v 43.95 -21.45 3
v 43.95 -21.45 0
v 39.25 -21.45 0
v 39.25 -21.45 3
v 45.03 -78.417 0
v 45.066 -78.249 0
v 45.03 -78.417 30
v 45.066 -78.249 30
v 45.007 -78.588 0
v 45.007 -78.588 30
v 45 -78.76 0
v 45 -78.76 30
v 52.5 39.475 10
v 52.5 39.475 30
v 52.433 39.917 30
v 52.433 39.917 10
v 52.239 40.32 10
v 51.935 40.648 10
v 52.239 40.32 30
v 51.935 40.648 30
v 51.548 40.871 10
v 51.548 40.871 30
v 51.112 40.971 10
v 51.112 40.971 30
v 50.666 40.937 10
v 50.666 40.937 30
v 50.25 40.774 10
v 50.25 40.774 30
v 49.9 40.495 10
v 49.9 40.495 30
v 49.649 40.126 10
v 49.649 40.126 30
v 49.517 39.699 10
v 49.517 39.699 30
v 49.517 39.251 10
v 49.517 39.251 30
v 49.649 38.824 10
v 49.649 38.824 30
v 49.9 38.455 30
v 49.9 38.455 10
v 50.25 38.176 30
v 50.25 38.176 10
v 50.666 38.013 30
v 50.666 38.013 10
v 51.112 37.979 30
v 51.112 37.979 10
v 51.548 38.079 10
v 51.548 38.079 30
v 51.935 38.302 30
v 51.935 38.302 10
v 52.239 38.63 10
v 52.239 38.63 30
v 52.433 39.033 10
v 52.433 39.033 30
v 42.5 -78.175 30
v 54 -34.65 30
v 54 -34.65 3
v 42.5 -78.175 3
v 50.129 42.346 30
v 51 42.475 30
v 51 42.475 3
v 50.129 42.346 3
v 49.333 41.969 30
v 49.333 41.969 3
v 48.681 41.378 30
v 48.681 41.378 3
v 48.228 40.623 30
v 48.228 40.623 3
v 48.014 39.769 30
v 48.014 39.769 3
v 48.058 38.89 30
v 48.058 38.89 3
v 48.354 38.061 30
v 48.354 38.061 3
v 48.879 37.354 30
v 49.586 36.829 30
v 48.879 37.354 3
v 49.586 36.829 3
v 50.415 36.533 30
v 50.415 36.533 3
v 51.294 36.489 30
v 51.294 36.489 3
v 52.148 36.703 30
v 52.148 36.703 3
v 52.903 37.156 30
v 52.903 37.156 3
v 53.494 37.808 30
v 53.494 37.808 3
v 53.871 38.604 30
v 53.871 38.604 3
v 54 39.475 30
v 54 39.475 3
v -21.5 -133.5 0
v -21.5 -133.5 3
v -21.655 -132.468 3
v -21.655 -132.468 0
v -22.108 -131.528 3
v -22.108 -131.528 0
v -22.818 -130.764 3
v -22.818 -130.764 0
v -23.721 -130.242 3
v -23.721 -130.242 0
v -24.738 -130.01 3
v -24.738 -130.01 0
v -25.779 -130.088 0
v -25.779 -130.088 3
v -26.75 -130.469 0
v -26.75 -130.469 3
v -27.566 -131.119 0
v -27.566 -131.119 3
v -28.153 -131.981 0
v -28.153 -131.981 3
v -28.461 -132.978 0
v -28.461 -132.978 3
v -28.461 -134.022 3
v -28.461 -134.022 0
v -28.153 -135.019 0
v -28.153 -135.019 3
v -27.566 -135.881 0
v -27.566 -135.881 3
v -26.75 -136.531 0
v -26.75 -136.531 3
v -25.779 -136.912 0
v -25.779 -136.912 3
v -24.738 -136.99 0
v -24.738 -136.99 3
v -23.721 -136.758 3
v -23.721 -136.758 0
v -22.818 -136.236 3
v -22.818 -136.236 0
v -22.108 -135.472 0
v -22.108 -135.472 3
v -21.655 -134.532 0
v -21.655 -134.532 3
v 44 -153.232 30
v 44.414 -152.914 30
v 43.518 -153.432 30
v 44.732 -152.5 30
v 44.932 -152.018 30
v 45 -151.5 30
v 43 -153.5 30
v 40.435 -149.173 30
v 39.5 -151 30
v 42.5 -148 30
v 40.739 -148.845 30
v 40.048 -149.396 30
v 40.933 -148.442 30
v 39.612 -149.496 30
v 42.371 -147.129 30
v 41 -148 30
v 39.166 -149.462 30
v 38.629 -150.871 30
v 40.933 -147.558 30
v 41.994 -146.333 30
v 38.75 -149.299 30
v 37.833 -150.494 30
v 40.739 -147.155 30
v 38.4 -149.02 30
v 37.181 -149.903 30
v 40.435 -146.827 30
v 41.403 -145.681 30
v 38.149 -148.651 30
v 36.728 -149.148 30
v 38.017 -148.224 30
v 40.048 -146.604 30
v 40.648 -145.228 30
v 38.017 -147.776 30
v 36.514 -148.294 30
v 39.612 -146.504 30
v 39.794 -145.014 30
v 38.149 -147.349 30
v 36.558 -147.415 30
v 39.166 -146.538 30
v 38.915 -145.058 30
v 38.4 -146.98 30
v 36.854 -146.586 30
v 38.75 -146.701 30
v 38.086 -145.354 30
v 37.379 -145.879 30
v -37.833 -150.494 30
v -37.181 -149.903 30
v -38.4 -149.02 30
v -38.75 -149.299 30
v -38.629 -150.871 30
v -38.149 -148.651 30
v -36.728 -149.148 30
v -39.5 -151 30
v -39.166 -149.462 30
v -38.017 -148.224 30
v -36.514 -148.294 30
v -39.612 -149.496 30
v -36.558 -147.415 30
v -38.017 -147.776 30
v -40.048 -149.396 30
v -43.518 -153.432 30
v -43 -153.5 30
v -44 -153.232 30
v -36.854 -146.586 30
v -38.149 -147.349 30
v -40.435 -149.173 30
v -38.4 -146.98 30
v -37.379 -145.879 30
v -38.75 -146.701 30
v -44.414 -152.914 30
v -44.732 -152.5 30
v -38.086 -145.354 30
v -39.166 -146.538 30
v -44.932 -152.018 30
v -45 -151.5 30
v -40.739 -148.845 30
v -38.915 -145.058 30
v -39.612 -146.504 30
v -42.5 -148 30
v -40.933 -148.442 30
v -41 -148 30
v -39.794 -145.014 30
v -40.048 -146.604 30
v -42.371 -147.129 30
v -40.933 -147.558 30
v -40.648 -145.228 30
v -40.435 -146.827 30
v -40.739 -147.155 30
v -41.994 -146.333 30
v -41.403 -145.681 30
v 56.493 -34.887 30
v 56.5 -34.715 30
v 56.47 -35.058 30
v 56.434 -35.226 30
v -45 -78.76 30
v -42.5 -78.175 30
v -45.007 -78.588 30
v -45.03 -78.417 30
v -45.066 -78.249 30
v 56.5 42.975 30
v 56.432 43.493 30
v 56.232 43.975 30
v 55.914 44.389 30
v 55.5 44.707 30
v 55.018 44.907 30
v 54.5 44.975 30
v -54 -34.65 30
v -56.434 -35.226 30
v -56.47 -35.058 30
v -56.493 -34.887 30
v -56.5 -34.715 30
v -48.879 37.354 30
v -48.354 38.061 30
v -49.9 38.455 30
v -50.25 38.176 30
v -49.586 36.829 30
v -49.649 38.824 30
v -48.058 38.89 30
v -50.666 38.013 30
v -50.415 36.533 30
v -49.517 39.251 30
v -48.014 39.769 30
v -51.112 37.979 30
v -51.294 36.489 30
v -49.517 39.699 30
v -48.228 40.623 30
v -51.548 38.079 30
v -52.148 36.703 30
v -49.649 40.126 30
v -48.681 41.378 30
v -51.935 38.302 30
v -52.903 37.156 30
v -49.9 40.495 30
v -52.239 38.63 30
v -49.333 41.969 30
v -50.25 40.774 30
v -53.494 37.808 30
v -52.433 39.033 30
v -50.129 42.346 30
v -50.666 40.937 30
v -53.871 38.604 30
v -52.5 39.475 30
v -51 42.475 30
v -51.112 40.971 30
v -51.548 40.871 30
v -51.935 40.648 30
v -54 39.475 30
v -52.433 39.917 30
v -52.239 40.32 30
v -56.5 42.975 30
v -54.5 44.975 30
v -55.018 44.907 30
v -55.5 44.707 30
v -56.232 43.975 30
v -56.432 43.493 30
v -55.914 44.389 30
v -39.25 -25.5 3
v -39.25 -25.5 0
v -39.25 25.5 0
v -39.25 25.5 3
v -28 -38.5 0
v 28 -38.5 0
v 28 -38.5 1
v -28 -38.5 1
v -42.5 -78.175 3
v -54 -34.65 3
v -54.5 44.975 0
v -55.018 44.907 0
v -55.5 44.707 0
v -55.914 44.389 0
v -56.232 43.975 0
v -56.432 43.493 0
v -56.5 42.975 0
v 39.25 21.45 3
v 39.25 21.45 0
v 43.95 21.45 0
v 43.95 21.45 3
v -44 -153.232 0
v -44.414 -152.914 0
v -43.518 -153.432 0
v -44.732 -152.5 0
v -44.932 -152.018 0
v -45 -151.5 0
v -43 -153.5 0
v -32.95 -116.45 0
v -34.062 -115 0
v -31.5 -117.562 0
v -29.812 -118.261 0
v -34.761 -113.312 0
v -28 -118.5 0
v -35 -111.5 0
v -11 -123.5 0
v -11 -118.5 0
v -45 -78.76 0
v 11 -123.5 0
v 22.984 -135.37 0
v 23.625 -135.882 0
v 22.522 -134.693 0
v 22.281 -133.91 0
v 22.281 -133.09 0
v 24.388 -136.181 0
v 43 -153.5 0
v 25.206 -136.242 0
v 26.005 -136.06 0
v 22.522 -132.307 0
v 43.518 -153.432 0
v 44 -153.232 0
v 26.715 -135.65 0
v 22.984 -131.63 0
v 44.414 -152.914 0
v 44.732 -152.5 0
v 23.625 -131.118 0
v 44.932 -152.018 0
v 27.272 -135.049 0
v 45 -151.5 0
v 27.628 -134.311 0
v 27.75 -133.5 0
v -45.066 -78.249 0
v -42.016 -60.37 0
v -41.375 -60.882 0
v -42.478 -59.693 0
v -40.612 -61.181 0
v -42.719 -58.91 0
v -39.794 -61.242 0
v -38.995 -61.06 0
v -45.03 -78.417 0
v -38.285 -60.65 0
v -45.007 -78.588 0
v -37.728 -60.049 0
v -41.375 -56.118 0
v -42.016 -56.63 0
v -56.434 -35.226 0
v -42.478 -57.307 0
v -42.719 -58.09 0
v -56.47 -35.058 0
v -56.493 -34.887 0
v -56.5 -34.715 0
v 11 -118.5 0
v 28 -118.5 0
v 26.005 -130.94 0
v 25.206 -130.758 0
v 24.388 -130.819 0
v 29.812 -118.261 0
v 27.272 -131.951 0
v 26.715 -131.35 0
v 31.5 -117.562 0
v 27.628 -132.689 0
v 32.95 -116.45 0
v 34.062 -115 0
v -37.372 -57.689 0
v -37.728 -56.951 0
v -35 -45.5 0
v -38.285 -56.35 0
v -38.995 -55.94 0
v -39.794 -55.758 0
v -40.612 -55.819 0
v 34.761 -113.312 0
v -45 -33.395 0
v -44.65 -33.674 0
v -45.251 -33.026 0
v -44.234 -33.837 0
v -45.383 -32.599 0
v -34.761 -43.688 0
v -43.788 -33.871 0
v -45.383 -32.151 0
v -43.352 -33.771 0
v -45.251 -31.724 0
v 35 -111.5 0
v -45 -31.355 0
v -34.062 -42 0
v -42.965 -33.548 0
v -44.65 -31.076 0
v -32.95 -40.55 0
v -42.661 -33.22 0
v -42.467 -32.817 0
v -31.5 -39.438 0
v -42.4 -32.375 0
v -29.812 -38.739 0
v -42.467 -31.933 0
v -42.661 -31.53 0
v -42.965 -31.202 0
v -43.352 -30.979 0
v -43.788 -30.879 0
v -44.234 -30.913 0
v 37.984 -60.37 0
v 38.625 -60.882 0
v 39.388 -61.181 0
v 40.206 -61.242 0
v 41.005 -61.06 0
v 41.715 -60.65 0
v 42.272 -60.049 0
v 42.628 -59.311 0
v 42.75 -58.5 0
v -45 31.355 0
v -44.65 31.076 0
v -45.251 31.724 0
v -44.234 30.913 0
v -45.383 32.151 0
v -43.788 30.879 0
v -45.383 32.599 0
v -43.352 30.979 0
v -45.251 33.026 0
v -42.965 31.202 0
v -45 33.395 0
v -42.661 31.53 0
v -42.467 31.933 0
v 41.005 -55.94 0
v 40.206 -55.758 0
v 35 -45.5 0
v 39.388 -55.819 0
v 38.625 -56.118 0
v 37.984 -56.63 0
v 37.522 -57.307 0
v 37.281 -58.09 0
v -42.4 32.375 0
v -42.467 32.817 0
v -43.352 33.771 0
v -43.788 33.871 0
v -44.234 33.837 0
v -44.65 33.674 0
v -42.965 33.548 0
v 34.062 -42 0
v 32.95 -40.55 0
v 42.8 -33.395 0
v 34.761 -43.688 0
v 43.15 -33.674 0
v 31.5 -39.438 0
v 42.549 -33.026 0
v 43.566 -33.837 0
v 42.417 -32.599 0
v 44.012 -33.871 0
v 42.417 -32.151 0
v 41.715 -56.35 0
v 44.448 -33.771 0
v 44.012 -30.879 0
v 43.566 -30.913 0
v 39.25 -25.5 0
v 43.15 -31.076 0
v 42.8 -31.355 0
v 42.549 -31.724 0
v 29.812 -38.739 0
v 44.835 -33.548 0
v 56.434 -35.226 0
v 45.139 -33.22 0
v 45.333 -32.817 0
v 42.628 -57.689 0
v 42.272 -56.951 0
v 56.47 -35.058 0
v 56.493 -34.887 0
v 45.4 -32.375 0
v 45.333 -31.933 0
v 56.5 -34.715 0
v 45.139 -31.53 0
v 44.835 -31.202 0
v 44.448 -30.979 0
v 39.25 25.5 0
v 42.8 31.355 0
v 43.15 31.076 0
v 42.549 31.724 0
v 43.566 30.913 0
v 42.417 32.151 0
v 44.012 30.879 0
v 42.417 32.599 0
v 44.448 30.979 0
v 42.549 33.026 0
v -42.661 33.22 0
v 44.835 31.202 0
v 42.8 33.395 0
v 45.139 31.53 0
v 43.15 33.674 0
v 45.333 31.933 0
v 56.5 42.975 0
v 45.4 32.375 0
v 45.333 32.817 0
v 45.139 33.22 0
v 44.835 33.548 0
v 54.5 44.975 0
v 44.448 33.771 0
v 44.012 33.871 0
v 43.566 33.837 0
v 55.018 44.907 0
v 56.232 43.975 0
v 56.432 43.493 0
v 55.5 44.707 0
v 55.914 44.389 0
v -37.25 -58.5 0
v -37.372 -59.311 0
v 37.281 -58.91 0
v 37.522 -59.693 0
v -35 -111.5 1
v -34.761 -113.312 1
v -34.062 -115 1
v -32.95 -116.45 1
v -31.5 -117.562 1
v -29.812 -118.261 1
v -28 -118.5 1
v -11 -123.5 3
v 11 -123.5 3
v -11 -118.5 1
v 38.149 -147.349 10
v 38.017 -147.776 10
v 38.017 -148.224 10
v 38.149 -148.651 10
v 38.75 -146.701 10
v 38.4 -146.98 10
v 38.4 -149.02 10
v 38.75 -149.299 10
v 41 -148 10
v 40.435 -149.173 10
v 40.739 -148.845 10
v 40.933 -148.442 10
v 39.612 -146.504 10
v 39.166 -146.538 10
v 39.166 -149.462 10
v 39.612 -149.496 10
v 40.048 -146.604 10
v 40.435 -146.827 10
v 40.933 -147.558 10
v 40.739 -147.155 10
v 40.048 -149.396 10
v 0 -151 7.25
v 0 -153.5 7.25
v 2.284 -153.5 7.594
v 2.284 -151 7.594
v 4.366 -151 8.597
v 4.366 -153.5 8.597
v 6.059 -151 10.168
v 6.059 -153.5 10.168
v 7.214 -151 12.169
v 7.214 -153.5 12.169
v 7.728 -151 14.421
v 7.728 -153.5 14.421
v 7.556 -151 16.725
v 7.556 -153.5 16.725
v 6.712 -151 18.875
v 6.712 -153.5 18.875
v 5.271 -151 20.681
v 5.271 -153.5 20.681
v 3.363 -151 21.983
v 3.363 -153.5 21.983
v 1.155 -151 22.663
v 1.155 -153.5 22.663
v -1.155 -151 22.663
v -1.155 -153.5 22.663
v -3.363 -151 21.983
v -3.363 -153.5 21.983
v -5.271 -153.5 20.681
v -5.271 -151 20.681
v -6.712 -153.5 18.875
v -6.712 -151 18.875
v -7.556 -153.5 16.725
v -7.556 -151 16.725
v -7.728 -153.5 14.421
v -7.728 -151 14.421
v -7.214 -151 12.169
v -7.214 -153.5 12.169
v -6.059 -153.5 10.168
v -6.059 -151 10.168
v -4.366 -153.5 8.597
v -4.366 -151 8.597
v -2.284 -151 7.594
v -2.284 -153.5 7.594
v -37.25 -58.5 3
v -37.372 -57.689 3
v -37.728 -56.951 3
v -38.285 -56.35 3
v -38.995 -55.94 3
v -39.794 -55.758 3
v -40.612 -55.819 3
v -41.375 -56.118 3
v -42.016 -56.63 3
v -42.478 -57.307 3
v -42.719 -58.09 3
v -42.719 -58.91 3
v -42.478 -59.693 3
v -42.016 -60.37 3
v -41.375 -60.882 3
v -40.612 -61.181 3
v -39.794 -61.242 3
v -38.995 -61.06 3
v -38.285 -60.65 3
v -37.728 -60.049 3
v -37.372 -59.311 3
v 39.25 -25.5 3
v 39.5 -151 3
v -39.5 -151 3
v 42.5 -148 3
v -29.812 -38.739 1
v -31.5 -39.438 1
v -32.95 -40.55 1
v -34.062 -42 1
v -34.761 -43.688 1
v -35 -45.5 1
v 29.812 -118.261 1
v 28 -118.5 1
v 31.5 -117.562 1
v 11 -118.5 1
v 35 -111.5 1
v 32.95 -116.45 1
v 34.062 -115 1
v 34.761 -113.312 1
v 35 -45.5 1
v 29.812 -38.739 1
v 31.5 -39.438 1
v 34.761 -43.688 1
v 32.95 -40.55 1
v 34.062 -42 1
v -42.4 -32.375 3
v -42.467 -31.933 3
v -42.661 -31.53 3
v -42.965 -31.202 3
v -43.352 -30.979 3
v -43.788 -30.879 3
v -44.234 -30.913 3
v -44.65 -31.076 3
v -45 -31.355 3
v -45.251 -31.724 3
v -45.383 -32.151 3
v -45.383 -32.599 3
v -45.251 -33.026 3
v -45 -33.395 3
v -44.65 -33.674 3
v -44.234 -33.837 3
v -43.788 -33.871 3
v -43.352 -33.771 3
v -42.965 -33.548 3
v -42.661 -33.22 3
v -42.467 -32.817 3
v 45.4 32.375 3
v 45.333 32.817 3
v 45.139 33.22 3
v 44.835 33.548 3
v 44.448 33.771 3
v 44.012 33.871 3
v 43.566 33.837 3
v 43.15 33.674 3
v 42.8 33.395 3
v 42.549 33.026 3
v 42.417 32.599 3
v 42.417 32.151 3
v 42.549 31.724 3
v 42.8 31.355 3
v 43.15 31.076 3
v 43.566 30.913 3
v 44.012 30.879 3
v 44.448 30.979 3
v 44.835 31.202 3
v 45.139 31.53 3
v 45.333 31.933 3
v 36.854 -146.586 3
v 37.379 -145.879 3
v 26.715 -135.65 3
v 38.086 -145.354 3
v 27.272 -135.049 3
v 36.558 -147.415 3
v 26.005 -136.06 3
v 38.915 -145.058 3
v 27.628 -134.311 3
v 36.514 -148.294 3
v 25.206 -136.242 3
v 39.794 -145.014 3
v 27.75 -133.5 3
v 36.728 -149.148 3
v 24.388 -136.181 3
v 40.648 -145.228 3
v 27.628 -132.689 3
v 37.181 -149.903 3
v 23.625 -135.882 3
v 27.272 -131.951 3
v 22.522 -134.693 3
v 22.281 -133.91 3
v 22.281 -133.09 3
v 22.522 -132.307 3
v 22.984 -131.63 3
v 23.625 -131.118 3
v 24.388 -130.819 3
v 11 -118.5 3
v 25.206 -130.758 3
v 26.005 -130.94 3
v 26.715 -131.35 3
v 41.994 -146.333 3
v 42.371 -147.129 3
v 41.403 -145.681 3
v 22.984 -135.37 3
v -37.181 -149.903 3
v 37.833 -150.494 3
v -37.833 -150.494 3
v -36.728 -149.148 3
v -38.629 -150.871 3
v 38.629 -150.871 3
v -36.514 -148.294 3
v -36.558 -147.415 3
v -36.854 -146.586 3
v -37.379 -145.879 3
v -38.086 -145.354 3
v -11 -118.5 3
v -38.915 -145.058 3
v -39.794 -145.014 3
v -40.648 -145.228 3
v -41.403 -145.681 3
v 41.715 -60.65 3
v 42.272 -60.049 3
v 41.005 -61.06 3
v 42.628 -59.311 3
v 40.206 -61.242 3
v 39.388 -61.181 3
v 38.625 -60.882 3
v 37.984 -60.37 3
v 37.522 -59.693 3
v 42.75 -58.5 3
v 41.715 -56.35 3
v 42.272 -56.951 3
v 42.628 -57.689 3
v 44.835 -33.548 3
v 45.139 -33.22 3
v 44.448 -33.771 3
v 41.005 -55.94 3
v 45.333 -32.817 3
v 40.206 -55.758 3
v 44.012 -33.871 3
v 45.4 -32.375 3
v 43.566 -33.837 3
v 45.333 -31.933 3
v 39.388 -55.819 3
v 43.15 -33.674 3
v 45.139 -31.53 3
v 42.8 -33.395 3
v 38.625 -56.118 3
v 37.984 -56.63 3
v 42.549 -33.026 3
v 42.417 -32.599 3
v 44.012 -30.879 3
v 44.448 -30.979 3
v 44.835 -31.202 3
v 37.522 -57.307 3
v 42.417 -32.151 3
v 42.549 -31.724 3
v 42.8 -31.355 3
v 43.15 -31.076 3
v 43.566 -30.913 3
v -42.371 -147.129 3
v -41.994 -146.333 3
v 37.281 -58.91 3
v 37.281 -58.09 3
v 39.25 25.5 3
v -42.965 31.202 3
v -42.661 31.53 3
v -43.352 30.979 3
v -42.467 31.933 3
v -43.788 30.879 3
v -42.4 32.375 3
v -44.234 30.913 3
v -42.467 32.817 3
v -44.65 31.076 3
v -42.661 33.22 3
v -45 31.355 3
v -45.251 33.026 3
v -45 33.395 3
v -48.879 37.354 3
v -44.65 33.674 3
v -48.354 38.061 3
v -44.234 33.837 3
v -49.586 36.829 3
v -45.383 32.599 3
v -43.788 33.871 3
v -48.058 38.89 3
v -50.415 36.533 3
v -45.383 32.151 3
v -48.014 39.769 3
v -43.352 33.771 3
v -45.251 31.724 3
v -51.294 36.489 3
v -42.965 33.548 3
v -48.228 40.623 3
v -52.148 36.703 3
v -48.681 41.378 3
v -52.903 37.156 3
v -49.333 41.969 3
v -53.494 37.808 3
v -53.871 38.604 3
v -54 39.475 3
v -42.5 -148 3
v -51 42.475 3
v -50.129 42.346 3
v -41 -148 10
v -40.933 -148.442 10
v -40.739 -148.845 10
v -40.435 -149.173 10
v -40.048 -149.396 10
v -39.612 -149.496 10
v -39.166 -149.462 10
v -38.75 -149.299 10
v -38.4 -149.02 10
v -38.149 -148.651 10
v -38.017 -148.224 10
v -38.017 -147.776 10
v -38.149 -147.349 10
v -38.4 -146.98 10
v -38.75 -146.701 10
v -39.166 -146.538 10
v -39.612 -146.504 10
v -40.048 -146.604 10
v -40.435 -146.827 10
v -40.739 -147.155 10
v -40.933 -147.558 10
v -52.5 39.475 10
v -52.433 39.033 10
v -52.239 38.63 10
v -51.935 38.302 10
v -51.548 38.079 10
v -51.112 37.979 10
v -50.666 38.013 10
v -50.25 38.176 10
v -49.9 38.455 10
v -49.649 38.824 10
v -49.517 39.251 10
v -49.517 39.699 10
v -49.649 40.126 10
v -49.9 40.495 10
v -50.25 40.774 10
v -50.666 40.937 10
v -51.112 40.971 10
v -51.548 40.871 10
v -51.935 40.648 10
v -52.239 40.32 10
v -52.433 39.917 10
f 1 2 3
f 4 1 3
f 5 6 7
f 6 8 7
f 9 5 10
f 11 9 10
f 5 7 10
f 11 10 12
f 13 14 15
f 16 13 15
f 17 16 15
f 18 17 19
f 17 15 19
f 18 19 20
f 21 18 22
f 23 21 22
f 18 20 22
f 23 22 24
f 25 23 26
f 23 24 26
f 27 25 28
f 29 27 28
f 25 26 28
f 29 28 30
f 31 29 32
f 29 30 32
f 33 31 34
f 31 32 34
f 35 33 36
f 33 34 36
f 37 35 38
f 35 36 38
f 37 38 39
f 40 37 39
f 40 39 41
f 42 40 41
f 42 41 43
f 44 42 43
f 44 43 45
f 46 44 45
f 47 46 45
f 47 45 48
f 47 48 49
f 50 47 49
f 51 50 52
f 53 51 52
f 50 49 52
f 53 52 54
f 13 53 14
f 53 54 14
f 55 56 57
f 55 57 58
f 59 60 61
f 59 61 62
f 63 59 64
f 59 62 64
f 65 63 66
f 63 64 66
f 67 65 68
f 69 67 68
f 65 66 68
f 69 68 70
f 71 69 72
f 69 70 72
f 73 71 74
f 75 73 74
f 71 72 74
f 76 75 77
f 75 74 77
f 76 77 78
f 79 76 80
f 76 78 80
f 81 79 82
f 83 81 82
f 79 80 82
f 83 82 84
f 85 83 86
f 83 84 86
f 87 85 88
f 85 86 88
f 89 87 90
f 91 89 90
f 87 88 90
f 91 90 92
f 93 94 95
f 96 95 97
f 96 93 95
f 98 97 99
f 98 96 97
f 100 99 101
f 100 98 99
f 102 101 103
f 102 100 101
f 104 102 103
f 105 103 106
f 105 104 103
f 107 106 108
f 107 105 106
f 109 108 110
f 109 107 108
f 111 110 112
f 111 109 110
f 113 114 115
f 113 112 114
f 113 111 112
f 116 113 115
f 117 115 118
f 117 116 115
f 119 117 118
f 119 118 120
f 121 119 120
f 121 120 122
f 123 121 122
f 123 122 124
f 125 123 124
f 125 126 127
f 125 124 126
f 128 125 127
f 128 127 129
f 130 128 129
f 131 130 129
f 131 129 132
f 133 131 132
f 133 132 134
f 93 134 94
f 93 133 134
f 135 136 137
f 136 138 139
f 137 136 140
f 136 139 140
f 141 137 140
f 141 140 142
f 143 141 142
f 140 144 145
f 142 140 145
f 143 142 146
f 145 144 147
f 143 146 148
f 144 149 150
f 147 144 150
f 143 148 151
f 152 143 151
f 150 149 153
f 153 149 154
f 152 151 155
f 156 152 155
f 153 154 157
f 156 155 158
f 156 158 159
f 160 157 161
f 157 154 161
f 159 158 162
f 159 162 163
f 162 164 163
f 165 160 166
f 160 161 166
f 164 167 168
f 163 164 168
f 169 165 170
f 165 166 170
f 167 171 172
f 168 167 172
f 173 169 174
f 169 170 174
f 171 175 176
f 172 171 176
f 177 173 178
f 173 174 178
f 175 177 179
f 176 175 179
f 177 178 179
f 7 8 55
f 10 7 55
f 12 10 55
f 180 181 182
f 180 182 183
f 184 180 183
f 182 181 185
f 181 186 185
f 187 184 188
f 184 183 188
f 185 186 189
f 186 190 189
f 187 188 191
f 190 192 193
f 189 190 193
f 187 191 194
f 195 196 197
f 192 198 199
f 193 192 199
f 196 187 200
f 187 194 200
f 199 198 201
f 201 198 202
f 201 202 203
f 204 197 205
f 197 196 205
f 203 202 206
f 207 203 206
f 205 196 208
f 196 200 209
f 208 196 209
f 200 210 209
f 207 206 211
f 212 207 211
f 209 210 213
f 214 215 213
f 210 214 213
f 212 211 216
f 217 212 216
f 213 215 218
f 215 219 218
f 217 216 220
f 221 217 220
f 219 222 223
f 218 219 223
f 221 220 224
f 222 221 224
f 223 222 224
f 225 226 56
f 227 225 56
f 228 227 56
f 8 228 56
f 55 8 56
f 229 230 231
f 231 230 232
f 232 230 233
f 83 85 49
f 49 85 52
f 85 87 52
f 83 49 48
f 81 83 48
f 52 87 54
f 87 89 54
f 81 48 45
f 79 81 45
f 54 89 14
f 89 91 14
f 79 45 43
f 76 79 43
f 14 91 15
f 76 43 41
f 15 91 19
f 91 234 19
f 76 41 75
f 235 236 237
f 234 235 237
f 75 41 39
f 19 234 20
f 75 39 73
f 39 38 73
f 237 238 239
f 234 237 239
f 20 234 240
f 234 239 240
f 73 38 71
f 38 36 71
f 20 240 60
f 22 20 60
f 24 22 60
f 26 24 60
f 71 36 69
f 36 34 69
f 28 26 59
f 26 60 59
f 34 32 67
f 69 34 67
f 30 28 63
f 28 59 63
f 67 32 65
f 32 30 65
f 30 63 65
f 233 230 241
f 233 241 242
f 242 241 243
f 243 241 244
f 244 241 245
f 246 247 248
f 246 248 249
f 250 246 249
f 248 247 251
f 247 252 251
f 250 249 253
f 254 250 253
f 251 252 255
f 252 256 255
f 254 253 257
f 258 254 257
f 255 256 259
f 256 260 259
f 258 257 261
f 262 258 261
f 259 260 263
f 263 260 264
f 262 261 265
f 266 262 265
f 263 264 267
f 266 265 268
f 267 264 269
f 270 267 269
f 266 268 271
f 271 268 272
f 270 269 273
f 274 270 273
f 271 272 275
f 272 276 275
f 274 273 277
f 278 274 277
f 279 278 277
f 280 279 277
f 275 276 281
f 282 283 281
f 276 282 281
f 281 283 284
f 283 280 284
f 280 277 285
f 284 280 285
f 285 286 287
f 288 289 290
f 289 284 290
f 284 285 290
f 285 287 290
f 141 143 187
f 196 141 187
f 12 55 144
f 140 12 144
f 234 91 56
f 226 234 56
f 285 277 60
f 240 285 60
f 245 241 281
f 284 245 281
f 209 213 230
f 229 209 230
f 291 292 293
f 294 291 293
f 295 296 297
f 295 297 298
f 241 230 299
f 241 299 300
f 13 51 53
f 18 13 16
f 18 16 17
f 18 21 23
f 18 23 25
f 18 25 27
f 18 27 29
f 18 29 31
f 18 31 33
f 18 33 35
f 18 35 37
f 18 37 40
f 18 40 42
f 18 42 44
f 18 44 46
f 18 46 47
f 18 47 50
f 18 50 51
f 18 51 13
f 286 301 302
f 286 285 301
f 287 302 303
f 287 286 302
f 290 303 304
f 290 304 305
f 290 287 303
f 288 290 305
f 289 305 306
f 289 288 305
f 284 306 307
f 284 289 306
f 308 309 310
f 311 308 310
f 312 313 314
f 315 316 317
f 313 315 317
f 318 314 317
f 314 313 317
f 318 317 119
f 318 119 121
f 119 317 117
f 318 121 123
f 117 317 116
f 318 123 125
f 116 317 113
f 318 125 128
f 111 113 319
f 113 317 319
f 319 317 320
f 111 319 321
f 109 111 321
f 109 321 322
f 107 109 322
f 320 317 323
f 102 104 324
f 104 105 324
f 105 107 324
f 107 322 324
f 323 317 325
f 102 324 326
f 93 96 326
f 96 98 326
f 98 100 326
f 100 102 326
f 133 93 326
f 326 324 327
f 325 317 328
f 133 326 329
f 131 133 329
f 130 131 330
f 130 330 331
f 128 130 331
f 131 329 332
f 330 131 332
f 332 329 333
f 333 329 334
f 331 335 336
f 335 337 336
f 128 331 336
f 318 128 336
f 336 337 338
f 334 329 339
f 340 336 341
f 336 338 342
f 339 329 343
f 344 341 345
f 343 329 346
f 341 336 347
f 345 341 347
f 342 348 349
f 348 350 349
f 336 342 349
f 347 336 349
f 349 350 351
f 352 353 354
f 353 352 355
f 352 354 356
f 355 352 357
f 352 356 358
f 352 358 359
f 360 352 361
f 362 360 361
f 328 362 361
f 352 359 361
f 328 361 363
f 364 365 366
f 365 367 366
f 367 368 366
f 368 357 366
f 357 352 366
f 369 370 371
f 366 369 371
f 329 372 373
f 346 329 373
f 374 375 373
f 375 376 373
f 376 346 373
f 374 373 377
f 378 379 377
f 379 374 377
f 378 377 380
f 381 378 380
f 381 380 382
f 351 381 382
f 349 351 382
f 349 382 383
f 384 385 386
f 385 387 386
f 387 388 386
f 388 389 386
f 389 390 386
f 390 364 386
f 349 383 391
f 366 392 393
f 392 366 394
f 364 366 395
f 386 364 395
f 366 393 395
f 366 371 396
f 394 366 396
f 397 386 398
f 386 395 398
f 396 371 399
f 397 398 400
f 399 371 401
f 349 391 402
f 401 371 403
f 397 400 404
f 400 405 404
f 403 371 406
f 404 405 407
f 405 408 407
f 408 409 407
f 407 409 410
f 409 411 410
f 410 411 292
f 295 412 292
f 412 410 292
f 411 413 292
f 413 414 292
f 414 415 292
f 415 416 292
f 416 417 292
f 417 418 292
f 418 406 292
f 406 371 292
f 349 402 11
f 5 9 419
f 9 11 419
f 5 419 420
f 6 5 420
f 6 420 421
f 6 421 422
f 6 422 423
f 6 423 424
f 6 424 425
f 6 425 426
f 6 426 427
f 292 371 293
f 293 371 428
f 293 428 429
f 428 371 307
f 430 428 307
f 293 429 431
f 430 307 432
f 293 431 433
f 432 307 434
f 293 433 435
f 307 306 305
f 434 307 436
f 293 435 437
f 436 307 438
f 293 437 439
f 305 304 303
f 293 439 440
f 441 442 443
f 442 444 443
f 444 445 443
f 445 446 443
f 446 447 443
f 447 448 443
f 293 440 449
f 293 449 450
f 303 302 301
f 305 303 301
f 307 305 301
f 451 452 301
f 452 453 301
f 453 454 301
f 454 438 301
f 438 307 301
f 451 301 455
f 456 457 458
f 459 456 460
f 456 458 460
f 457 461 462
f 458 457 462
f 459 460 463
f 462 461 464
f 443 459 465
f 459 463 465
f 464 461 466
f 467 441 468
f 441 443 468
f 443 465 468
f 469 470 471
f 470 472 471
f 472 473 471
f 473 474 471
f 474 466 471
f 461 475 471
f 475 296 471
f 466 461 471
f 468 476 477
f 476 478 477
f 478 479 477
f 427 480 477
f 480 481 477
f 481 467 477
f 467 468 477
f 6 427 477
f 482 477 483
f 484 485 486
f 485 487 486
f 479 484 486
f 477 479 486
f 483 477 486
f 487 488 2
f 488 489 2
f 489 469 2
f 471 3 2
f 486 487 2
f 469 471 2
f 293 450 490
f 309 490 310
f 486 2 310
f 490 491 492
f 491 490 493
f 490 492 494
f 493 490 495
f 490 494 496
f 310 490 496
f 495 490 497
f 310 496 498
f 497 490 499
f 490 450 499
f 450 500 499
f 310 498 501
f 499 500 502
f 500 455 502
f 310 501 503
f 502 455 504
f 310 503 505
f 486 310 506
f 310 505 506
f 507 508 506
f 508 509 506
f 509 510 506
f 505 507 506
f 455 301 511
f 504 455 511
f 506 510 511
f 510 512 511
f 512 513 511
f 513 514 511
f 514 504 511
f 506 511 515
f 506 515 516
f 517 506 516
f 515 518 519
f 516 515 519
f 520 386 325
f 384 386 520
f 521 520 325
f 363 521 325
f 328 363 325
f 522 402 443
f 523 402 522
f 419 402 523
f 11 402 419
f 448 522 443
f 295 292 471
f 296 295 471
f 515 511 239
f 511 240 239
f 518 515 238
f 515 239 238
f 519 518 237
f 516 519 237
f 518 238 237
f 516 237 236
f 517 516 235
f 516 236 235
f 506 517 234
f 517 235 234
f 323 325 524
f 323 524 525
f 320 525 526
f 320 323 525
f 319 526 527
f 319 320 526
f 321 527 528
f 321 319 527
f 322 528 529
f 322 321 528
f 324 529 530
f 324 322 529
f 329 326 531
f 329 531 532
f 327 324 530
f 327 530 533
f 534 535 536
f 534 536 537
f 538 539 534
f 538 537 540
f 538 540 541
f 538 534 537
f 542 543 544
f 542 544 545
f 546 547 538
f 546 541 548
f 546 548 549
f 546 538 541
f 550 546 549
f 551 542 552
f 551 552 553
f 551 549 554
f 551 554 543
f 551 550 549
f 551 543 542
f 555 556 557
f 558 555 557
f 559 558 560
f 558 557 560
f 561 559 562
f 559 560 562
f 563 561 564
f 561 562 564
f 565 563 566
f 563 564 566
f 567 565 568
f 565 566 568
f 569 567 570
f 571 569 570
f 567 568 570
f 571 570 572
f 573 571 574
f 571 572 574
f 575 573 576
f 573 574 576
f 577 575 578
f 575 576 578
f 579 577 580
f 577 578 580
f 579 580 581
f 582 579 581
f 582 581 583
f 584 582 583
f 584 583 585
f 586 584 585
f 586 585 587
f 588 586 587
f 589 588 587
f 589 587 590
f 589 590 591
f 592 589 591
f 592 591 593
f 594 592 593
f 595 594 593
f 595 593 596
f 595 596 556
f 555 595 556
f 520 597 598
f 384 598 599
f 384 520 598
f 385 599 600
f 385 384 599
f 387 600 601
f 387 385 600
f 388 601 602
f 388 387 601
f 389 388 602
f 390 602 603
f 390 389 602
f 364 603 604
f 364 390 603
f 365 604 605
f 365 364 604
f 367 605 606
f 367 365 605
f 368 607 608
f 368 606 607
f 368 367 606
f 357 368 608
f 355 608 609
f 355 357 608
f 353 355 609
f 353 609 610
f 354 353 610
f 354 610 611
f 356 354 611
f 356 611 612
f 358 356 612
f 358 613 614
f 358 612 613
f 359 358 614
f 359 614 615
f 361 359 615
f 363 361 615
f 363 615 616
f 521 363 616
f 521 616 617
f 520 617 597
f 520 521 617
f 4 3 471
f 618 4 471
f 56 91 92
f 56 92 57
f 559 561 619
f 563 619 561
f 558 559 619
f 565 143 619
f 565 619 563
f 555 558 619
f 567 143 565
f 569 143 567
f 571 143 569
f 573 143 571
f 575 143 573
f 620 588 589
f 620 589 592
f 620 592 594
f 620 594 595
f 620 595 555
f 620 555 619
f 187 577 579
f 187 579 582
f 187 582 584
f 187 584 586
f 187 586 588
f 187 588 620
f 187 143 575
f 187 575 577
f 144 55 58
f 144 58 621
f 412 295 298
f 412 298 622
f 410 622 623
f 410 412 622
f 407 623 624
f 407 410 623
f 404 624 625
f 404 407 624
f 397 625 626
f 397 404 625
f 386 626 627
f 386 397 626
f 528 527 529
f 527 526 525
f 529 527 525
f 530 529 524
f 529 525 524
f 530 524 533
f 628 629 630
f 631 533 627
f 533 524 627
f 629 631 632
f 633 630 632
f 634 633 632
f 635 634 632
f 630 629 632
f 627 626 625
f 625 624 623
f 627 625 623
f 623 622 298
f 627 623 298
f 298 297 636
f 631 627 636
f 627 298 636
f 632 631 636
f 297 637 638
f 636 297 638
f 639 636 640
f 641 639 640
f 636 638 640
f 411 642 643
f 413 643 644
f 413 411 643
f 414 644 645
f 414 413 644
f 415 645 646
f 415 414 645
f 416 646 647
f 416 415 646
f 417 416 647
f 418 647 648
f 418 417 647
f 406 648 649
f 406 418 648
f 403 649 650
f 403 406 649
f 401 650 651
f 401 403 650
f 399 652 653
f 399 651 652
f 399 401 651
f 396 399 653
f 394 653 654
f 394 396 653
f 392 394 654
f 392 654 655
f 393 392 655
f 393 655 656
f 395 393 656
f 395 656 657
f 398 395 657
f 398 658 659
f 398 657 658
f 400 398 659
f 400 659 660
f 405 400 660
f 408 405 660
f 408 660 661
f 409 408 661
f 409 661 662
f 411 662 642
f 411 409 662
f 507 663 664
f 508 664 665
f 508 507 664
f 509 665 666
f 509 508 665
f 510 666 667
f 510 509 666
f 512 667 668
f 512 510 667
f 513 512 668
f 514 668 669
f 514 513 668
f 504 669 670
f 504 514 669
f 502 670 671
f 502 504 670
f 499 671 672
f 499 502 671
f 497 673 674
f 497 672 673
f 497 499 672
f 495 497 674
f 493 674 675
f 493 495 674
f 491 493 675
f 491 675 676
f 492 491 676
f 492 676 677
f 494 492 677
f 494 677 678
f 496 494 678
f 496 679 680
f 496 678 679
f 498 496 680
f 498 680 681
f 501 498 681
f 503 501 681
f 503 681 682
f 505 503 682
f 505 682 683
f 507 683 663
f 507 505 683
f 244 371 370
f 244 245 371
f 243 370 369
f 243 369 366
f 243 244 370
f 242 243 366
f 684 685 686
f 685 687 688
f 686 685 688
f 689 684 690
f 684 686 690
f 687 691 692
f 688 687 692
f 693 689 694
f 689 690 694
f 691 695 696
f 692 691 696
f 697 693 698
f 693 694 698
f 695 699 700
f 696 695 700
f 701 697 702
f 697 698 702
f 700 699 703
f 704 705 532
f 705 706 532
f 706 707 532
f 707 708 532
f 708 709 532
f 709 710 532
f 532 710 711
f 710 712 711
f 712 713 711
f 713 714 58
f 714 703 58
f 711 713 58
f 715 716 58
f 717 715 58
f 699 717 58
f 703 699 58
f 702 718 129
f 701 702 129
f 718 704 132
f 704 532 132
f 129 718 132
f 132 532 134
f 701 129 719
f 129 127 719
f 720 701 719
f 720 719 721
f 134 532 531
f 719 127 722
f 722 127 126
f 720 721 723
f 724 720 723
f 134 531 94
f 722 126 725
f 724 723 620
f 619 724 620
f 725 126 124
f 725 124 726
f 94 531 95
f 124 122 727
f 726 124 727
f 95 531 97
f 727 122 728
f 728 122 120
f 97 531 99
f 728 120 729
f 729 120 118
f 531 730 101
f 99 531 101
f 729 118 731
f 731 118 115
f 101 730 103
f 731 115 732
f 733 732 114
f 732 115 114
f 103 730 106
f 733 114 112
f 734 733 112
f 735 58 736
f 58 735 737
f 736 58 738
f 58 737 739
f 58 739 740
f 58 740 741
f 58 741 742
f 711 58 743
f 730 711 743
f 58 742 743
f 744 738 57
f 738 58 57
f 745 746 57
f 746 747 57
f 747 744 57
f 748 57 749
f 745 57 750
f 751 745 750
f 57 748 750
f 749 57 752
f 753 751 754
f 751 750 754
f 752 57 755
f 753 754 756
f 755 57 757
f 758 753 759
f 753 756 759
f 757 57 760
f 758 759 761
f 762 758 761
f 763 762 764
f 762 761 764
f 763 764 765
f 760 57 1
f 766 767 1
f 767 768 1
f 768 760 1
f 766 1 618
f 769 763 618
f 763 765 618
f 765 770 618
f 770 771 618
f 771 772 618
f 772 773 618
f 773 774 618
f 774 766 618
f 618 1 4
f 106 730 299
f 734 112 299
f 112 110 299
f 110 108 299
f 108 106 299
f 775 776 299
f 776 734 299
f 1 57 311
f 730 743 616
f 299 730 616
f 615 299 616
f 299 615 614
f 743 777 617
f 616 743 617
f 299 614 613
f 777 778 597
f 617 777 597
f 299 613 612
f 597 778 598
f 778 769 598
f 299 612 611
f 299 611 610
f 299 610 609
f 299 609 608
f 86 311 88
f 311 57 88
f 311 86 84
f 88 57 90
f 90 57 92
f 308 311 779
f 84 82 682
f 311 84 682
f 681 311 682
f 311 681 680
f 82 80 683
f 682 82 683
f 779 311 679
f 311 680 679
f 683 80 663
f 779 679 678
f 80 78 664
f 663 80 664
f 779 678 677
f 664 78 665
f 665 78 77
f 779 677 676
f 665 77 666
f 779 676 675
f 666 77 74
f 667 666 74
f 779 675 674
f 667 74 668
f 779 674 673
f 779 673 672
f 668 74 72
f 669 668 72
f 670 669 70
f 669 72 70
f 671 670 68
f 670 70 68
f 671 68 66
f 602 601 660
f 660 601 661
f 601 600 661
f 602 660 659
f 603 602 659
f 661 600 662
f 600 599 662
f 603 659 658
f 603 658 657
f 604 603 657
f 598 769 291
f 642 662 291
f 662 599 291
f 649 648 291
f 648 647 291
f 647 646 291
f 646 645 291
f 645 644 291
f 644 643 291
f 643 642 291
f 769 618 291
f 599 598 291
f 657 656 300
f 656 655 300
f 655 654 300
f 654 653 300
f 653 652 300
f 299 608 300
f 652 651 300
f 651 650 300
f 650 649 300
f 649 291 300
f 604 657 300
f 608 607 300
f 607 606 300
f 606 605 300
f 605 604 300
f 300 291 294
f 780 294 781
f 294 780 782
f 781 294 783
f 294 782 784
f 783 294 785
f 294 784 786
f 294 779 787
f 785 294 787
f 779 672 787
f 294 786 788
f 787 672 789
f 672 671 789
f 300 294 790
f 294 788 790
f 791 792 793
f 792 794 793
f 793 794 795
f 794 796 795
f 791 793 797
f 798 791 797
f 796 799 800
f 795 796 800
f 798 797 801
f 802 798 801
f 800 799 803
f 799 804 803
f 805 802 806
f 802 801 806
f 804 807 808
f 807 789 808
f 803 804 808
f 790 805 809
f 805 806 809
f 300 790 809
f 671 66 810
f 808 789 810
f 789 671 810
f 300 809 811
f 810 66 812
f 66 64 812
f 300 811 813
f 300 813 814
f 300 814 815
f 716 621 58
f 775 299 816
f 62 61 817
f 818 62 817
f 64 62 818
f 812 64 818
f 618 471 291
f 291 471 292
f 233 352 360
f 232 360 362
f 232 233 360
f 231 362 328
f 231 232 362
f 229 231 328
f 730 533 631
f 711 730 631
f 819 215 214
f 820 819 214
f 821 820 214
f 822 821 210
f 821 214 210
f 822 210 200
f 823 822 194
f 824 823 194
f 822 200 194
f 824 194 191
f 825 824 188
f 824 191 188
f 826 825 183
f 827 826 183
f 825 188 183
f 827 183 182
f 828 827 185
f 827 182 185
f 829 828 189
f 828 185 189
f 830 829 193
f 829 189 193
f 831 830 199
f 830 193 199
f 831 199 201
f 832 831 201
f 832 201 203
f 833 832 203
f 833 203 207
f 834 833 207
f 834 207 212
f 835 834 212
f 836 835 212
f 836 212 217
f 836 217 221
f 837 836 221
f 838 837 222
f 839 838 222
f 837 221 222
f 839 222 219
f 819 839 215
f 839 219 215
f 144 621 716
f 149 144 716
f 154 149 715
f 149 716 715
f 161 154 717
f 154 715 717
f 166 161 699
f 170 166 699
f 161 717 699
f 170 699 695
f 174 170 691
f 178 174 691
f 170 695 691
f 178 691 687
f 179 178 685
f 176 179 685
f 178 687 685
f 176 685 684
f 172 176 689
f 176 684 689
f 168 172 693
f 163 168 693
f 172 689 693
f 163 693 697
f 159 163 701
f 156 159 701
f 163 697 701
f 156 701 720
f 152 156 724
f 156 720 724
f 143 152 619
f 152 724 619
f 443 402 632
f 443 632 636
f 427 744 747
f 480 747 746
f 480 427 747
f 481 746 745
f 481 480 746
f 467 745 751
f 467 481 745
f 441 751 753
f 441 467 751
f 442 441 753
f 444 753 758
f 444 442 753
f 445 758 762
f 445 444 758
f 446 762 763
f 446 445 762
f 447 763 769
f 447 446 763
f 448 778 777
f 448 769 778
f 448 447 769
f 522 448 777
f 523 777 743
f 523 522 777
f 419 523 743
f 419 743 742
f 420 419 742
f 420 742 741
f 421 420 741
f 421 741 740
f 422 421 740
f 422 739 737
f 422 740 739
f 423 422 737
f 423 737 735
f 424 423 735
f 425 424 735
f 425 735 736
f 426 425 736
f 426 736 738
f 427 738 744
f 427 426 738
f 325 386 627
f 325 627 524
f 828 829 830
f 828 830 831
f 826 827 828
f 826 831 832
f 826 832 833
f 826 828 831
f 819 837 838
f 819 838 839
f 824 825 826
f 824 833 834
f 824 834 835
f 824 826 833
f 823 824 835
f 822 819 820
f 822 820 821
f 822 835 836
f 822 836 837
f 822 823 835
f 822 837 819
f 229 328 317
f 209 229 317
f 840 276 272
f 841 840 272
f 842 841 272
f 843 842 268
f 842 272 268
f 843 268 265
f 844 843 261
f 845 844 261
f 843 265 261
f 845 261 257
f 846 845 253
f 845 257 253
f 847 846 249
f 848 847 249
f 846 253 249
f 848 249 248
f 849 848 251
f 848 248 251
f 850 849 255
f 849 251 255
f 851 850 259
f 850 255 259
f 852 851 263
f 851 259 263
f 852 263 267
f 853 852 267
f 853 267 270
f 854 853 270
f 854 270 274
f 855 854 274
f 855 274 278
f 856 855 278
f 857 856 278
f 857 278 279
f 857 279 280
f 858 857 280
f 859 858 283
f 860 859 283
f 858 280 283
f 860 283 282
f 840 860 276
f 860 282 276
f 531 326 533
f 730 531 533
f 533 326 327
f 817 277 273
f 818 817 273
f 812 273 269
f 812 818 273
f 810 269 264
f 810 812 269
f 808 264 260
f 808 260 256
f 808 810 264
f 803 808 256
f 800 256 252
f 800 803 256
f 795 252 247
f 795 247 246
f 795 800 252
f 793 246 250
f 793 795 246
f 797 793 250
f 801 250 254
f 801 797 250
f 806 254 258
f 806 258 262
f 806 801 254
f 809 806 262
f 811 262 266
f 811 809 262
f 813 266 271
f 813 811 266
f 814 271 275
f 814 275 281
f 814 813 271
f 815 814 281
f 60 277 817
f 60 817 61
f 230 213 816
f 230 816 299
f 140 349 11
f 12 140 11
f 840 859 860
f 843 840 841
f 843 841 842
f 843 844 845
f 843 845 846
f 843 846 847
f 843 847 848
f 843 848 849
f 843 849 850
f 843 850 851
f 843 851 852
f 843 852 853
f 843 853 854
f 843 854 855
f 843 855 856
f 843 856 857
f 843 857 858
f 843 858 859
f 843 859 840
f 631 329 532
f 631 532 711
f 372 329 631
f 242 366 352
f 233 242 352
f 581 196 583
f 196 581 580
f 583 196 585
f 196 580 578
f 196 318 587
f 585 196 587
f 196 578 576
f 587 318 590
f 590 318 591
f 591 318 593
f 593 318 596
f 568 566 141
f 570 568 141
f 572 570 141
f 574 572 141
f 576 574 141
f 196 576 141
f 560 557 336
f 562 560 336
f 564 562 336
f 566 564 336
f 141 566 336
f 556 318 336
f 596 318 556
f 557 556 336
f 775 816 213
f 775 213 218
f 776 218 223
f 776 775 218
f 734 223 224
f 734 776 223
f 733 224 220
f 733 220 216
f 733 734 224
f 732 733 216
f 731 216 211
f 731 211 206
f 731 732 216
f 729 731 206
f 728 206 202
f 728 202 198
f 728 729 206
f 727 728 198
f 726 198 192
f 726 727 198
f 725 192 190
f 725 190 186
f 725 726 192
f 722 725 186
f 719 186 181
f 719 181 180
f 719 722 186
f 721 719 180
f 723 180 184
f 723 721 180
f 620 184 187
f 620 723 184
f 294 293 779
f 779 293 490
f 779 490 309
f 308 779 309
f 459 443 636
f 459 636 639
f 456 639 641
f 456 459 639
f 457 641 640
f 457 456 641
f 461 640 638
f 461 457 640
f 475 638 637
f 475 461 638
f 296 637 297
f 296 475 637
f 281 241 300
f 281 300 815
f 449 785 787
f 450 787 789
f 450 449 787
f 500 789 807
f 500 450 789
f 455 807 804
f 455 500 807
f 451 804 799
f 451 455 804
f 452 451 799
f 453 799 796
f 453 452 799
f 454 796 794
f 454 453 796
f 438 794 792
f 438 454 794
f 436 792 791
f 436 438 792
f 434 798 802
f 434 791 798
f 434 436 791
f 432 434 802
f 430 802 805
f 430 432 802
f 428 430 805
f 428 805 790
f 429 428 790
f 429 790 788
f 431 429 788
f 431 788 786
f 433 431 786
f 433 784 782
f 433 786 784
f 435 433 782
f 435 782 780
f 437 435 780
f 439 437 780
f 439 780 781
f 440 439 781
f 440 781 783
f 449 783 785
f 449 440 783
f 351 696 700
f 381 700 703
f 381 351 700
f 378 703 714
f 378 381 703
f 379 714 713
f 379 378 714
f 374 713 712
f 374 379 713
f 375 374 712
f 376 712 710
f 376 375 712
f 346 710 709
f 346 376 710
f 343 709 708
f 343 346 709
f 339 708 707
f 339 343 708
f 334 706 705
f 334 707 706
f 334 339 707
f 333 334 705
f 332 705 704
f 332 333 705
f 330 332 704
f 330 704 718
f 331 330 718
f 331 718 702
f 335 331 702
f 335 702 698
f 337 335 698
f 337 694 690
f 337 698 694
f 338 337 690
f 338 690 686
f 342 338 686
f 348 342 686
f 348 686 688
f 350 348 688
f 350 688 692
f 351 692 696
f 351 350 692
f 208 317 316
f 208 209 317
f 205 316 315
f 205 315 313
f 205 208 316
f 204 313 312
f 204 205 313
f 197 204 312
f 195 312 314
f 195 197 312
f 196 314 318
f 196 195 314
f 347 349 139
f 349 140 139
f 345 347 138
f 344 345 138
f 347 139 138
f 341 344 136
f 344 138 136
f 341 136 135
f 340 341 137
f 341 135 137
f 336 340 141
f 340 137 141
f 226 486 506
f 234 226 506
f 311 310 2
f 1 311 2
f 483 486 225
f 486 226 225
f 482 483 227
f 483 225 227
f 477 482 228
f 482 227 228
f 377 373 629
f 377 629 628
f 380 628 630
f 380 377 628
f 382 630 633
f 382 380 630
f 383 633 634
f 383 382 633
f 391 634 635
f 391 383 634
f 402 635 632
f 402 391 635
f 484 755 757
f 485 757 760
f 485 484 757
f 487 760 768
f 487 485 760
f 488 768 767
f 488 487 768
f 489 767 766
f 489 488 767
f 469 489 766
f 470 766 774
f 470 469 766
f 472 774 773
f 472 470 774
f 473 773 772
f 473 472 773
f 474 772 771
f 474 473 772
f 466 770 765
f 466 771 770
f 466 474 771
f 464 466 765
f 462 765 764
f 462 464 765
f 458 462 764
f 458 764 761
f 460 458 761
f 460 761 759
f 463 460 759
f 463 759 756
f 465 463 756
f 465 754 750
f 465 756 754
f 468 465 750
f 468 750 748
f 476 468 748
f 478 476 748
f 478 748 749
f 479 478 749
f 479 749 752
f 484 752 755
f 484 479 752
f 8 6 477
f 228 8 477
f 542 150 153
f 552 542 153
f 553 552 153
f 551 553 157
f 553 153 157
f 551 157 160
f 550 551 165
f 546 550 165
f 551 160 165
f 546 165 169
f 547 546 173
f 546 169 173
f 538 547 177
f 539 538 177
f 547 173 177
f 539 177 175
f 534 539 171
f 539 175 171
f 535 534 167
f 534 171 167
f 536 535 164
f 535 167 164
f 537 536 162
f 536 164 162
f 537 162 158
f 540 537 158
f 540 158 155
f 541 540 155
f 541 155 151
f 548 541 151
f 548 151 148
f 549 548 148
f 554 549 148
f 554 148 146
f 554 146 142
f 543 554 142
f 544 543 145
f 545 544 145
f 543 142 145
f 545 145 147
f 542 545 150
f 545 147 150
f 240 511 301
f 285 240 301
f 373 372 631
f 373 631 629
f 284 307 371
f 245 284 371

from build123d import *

# Parameters (mm, degrees)
SKETCH1_R           = 3.5
SKETCH1_R_2         = 2.75
SKETCH1_W           = 22
SKETCH1_H           = 5
SKETCH1_R_3         = 1.5
BOSS_EXTRUDE1_DEPTH = 30
CUT_EXTRUDE2_DEPTH  = 27
CUT_EXTRUDE4_DEPTH  = 1
FILLET1_R           = 2
BOSS_EXTRUDE2_DEPTH = 27
SKETCH6_R           = 1.5
CUT_EXTRUDE5_DEPTH  = 20
CUT_EXTRUDE6_REACH  = 210.53
SKETCH7_R           = 7.75


with BuildPart() as part:
    # Sketch1 → Boss-Extrude1 (new body)
    with BuildSketch(Plane.XY):
        Polygon((56.5, 44.975), (-56.5, 44.975), (-56.5, -34.975), (-45, -78.5), (-45, -153.5), (45, -153.5), (45, -78.5), (56.5, -34.975), align=None)
        with Locations((-25, -133.5)):
            Circle(SKETCH1_R, mode=Mode.SUBTRACT)
        with Locations((-40, -58.5)):
            Circle(SKETCH1_R_2, mode=Mode.SUBTRACT)
        with Locations((0, -121)):
            Rectangle(SKETCH1_W, SKETCH1_H, mode=Mode.SUBTRACT)
        with Locations((25, -133.5)):
            Circle(SKETCH1_R_2, mode=Mode.SUBTRACT)
        with Locations((40, -58.5)):
            Circle(SKETCH1_R_2, mode=Mode.SUBTRACT)
        with Locations((-43.9, -32.375)):
            Circle(SKETCH1_R_3, mode=Mode.SUBTRACT)
        with Locations((-43.9, 32.375)):
            Circle(SKETCH1_R_3, mode=Mode.SUBTRACT)
        with Locations((43.9, -32.375)):
            Circle(SKETCH1_R_3, mode=Mode.SUBTRACT)
        Polygon((-39.25, -25.5), (-39.25, 25.5), (39.25, 25.5), (39.25, 21.45), (43.95, 21.45), (43.95, -21.45), (39.25, -21.45), (39.25, -25.5), align=None, mode=Mode.SUBTRACT)
        with Locations((43.9, 32.375)):
            Circle(SKETCH1_R_3, mode=Mode.SUBTRACT)
    extrude(amount=BOSS_EXTRUDE1_DEPTH)

    # Sketch2 → Cut-Extrude2 (cut)
    with BuildSketch(Plane.XY.offset(30)):
        Polygon((54, 42.475), (54, -34.65030126), (42.5, -78.17530126), (42.5, -151), (-42.5, -151), (-42.5, -78.17530126), (-54, -34.65030126), (-54, 42.475), align=None)
    extrude(amount=-CUT_EXTRUDE2_DEPTH, mode=Mode.SUBTRACT)

    # Sketch1<3> → Cut-Extrude4 (cut)
    with BuildSketch(Plane.XY):
        with BuildLine():
            Line((-28, -118.5), (28, -118.5))
            ThreePointArc((28, -118.5), (32.949747468, -116.449747468), (35, -111.5))
            Line((35, -111.5), (35, -45.5))
            ThreePointArc((35, -45.5), (32.949747468, -40.550252532), (28, -38.5))
            Line((28, -38.5), (-28, -38.5))
            ThreePointArc((-28, -38.5), (-32.949747468, -40.550252532), (-35, -45.5))
            Line((-35, -45.5), (-35, -111.5))
            ThreePointArc((-35, -111.5), (-32.949747468, -116.449747468), (-28, -118.5))
        make_face()
    extrude(amount=CUT_EXTRUDE4_DEPTH, mode=Mode.SUBTRACT)

    # Fillet1
    fillet1_edges = [part.edges().sort_by_distance(p)[0] for p in [
        (56.5, 44.975, 15),
        (56.5, -34.975, 15),
        (45, -78.5, 15),
        (45, -153.5, 15),
        (-45, -153.5, 15),
        (-45, -78.5, 15),
        (-56.5, -34.975, 15),
        (-56.5, 44.975, 15),
    ]]
    fillet(fillet1_edges, radius=FILLET1_R)

    # Sketch5 → Boss-Extrude2 (add, through all)
    with BuildSketch(Plane.XY.offset(3)):
        with BuildLine():
            Line((-42.5, -151), (-42.5, -148))
            ThreePointArc((-42.5, -148), (-37.378679656, -145.878679656), (-39.5, -151))
            Line((-39.5, -151), (-42.5, -151))
        make_face()
        with BuildLine():
            Line((39.5, -151), (42.5, -151))
            Line((42.5, -151), (42.5, -148))
            ThreePointArc((42.5, -148), (37.378679656, -145.878679656), (39.5, -151))
        make_face()
        with BuildLine():
            Line((-54, 42.475), (-51, 42.475))
            ThreePointArc((-51, 42.475), (-48.878679656, 37.353679656), (-54, 39.475))
            Line((-54, 39.475), (-54, 42.475))
        make_face()
        with BuildLine():
            Line((54, 39.475), (54, 42.475))
            Line((54, 42.475), (51, 42.475))
            ThreePointArc((51, 42.475), (48.878679656, 37.353679656), (54, 39.475))
        make_face()
    extrude(amount=BOSS_EXTRUDE2_DEPTH)

    # Sketch6 → Cut-Extrude5 (cut)
    with BuildSketch(Plane.XY.offset(30)):
        with Locations((51, 39.475)):
            Circle(SKETCH6_R)
        with Locations((39.5, -148)):
            Circle(SKETCH6_R)
        with Locations(Location((-39.5, -148, 0), (0, 0, 180))):
            Circle(SKETCH6_R)
        with Locations(Location((-51, 39.475, 0), (0, 0, 180))):
            Circle(SKETCH6_R)
    extrude(amount=-CUT_EXTRUDE5_DEPTH, mode=Mode.SUBTRACT)

    # Sketch7 → Cut-Extrude6 (cut, up to next)
    with BuildSketch(Plane.XZ.offset(153.5), mode=Mode.PRIVATE) as cut_extrude6_sk1:
        with Locations(Location((0, 15, 0), (0, 0, 270))):
            Circle(SKETCH7_R)
    cut_extrude6_tool1 = extrude(cut_extrude6_sk1.sketch, amount=-CUT_EXTRUDE6_REACH, mode=Mode.PRIVATE) & part.part
    add(cut_extrude6_tool1.solids().sort_by_distance((0, -153.5, 15))[0], mode=Mode.SUBTRACT)


solid = part.part
